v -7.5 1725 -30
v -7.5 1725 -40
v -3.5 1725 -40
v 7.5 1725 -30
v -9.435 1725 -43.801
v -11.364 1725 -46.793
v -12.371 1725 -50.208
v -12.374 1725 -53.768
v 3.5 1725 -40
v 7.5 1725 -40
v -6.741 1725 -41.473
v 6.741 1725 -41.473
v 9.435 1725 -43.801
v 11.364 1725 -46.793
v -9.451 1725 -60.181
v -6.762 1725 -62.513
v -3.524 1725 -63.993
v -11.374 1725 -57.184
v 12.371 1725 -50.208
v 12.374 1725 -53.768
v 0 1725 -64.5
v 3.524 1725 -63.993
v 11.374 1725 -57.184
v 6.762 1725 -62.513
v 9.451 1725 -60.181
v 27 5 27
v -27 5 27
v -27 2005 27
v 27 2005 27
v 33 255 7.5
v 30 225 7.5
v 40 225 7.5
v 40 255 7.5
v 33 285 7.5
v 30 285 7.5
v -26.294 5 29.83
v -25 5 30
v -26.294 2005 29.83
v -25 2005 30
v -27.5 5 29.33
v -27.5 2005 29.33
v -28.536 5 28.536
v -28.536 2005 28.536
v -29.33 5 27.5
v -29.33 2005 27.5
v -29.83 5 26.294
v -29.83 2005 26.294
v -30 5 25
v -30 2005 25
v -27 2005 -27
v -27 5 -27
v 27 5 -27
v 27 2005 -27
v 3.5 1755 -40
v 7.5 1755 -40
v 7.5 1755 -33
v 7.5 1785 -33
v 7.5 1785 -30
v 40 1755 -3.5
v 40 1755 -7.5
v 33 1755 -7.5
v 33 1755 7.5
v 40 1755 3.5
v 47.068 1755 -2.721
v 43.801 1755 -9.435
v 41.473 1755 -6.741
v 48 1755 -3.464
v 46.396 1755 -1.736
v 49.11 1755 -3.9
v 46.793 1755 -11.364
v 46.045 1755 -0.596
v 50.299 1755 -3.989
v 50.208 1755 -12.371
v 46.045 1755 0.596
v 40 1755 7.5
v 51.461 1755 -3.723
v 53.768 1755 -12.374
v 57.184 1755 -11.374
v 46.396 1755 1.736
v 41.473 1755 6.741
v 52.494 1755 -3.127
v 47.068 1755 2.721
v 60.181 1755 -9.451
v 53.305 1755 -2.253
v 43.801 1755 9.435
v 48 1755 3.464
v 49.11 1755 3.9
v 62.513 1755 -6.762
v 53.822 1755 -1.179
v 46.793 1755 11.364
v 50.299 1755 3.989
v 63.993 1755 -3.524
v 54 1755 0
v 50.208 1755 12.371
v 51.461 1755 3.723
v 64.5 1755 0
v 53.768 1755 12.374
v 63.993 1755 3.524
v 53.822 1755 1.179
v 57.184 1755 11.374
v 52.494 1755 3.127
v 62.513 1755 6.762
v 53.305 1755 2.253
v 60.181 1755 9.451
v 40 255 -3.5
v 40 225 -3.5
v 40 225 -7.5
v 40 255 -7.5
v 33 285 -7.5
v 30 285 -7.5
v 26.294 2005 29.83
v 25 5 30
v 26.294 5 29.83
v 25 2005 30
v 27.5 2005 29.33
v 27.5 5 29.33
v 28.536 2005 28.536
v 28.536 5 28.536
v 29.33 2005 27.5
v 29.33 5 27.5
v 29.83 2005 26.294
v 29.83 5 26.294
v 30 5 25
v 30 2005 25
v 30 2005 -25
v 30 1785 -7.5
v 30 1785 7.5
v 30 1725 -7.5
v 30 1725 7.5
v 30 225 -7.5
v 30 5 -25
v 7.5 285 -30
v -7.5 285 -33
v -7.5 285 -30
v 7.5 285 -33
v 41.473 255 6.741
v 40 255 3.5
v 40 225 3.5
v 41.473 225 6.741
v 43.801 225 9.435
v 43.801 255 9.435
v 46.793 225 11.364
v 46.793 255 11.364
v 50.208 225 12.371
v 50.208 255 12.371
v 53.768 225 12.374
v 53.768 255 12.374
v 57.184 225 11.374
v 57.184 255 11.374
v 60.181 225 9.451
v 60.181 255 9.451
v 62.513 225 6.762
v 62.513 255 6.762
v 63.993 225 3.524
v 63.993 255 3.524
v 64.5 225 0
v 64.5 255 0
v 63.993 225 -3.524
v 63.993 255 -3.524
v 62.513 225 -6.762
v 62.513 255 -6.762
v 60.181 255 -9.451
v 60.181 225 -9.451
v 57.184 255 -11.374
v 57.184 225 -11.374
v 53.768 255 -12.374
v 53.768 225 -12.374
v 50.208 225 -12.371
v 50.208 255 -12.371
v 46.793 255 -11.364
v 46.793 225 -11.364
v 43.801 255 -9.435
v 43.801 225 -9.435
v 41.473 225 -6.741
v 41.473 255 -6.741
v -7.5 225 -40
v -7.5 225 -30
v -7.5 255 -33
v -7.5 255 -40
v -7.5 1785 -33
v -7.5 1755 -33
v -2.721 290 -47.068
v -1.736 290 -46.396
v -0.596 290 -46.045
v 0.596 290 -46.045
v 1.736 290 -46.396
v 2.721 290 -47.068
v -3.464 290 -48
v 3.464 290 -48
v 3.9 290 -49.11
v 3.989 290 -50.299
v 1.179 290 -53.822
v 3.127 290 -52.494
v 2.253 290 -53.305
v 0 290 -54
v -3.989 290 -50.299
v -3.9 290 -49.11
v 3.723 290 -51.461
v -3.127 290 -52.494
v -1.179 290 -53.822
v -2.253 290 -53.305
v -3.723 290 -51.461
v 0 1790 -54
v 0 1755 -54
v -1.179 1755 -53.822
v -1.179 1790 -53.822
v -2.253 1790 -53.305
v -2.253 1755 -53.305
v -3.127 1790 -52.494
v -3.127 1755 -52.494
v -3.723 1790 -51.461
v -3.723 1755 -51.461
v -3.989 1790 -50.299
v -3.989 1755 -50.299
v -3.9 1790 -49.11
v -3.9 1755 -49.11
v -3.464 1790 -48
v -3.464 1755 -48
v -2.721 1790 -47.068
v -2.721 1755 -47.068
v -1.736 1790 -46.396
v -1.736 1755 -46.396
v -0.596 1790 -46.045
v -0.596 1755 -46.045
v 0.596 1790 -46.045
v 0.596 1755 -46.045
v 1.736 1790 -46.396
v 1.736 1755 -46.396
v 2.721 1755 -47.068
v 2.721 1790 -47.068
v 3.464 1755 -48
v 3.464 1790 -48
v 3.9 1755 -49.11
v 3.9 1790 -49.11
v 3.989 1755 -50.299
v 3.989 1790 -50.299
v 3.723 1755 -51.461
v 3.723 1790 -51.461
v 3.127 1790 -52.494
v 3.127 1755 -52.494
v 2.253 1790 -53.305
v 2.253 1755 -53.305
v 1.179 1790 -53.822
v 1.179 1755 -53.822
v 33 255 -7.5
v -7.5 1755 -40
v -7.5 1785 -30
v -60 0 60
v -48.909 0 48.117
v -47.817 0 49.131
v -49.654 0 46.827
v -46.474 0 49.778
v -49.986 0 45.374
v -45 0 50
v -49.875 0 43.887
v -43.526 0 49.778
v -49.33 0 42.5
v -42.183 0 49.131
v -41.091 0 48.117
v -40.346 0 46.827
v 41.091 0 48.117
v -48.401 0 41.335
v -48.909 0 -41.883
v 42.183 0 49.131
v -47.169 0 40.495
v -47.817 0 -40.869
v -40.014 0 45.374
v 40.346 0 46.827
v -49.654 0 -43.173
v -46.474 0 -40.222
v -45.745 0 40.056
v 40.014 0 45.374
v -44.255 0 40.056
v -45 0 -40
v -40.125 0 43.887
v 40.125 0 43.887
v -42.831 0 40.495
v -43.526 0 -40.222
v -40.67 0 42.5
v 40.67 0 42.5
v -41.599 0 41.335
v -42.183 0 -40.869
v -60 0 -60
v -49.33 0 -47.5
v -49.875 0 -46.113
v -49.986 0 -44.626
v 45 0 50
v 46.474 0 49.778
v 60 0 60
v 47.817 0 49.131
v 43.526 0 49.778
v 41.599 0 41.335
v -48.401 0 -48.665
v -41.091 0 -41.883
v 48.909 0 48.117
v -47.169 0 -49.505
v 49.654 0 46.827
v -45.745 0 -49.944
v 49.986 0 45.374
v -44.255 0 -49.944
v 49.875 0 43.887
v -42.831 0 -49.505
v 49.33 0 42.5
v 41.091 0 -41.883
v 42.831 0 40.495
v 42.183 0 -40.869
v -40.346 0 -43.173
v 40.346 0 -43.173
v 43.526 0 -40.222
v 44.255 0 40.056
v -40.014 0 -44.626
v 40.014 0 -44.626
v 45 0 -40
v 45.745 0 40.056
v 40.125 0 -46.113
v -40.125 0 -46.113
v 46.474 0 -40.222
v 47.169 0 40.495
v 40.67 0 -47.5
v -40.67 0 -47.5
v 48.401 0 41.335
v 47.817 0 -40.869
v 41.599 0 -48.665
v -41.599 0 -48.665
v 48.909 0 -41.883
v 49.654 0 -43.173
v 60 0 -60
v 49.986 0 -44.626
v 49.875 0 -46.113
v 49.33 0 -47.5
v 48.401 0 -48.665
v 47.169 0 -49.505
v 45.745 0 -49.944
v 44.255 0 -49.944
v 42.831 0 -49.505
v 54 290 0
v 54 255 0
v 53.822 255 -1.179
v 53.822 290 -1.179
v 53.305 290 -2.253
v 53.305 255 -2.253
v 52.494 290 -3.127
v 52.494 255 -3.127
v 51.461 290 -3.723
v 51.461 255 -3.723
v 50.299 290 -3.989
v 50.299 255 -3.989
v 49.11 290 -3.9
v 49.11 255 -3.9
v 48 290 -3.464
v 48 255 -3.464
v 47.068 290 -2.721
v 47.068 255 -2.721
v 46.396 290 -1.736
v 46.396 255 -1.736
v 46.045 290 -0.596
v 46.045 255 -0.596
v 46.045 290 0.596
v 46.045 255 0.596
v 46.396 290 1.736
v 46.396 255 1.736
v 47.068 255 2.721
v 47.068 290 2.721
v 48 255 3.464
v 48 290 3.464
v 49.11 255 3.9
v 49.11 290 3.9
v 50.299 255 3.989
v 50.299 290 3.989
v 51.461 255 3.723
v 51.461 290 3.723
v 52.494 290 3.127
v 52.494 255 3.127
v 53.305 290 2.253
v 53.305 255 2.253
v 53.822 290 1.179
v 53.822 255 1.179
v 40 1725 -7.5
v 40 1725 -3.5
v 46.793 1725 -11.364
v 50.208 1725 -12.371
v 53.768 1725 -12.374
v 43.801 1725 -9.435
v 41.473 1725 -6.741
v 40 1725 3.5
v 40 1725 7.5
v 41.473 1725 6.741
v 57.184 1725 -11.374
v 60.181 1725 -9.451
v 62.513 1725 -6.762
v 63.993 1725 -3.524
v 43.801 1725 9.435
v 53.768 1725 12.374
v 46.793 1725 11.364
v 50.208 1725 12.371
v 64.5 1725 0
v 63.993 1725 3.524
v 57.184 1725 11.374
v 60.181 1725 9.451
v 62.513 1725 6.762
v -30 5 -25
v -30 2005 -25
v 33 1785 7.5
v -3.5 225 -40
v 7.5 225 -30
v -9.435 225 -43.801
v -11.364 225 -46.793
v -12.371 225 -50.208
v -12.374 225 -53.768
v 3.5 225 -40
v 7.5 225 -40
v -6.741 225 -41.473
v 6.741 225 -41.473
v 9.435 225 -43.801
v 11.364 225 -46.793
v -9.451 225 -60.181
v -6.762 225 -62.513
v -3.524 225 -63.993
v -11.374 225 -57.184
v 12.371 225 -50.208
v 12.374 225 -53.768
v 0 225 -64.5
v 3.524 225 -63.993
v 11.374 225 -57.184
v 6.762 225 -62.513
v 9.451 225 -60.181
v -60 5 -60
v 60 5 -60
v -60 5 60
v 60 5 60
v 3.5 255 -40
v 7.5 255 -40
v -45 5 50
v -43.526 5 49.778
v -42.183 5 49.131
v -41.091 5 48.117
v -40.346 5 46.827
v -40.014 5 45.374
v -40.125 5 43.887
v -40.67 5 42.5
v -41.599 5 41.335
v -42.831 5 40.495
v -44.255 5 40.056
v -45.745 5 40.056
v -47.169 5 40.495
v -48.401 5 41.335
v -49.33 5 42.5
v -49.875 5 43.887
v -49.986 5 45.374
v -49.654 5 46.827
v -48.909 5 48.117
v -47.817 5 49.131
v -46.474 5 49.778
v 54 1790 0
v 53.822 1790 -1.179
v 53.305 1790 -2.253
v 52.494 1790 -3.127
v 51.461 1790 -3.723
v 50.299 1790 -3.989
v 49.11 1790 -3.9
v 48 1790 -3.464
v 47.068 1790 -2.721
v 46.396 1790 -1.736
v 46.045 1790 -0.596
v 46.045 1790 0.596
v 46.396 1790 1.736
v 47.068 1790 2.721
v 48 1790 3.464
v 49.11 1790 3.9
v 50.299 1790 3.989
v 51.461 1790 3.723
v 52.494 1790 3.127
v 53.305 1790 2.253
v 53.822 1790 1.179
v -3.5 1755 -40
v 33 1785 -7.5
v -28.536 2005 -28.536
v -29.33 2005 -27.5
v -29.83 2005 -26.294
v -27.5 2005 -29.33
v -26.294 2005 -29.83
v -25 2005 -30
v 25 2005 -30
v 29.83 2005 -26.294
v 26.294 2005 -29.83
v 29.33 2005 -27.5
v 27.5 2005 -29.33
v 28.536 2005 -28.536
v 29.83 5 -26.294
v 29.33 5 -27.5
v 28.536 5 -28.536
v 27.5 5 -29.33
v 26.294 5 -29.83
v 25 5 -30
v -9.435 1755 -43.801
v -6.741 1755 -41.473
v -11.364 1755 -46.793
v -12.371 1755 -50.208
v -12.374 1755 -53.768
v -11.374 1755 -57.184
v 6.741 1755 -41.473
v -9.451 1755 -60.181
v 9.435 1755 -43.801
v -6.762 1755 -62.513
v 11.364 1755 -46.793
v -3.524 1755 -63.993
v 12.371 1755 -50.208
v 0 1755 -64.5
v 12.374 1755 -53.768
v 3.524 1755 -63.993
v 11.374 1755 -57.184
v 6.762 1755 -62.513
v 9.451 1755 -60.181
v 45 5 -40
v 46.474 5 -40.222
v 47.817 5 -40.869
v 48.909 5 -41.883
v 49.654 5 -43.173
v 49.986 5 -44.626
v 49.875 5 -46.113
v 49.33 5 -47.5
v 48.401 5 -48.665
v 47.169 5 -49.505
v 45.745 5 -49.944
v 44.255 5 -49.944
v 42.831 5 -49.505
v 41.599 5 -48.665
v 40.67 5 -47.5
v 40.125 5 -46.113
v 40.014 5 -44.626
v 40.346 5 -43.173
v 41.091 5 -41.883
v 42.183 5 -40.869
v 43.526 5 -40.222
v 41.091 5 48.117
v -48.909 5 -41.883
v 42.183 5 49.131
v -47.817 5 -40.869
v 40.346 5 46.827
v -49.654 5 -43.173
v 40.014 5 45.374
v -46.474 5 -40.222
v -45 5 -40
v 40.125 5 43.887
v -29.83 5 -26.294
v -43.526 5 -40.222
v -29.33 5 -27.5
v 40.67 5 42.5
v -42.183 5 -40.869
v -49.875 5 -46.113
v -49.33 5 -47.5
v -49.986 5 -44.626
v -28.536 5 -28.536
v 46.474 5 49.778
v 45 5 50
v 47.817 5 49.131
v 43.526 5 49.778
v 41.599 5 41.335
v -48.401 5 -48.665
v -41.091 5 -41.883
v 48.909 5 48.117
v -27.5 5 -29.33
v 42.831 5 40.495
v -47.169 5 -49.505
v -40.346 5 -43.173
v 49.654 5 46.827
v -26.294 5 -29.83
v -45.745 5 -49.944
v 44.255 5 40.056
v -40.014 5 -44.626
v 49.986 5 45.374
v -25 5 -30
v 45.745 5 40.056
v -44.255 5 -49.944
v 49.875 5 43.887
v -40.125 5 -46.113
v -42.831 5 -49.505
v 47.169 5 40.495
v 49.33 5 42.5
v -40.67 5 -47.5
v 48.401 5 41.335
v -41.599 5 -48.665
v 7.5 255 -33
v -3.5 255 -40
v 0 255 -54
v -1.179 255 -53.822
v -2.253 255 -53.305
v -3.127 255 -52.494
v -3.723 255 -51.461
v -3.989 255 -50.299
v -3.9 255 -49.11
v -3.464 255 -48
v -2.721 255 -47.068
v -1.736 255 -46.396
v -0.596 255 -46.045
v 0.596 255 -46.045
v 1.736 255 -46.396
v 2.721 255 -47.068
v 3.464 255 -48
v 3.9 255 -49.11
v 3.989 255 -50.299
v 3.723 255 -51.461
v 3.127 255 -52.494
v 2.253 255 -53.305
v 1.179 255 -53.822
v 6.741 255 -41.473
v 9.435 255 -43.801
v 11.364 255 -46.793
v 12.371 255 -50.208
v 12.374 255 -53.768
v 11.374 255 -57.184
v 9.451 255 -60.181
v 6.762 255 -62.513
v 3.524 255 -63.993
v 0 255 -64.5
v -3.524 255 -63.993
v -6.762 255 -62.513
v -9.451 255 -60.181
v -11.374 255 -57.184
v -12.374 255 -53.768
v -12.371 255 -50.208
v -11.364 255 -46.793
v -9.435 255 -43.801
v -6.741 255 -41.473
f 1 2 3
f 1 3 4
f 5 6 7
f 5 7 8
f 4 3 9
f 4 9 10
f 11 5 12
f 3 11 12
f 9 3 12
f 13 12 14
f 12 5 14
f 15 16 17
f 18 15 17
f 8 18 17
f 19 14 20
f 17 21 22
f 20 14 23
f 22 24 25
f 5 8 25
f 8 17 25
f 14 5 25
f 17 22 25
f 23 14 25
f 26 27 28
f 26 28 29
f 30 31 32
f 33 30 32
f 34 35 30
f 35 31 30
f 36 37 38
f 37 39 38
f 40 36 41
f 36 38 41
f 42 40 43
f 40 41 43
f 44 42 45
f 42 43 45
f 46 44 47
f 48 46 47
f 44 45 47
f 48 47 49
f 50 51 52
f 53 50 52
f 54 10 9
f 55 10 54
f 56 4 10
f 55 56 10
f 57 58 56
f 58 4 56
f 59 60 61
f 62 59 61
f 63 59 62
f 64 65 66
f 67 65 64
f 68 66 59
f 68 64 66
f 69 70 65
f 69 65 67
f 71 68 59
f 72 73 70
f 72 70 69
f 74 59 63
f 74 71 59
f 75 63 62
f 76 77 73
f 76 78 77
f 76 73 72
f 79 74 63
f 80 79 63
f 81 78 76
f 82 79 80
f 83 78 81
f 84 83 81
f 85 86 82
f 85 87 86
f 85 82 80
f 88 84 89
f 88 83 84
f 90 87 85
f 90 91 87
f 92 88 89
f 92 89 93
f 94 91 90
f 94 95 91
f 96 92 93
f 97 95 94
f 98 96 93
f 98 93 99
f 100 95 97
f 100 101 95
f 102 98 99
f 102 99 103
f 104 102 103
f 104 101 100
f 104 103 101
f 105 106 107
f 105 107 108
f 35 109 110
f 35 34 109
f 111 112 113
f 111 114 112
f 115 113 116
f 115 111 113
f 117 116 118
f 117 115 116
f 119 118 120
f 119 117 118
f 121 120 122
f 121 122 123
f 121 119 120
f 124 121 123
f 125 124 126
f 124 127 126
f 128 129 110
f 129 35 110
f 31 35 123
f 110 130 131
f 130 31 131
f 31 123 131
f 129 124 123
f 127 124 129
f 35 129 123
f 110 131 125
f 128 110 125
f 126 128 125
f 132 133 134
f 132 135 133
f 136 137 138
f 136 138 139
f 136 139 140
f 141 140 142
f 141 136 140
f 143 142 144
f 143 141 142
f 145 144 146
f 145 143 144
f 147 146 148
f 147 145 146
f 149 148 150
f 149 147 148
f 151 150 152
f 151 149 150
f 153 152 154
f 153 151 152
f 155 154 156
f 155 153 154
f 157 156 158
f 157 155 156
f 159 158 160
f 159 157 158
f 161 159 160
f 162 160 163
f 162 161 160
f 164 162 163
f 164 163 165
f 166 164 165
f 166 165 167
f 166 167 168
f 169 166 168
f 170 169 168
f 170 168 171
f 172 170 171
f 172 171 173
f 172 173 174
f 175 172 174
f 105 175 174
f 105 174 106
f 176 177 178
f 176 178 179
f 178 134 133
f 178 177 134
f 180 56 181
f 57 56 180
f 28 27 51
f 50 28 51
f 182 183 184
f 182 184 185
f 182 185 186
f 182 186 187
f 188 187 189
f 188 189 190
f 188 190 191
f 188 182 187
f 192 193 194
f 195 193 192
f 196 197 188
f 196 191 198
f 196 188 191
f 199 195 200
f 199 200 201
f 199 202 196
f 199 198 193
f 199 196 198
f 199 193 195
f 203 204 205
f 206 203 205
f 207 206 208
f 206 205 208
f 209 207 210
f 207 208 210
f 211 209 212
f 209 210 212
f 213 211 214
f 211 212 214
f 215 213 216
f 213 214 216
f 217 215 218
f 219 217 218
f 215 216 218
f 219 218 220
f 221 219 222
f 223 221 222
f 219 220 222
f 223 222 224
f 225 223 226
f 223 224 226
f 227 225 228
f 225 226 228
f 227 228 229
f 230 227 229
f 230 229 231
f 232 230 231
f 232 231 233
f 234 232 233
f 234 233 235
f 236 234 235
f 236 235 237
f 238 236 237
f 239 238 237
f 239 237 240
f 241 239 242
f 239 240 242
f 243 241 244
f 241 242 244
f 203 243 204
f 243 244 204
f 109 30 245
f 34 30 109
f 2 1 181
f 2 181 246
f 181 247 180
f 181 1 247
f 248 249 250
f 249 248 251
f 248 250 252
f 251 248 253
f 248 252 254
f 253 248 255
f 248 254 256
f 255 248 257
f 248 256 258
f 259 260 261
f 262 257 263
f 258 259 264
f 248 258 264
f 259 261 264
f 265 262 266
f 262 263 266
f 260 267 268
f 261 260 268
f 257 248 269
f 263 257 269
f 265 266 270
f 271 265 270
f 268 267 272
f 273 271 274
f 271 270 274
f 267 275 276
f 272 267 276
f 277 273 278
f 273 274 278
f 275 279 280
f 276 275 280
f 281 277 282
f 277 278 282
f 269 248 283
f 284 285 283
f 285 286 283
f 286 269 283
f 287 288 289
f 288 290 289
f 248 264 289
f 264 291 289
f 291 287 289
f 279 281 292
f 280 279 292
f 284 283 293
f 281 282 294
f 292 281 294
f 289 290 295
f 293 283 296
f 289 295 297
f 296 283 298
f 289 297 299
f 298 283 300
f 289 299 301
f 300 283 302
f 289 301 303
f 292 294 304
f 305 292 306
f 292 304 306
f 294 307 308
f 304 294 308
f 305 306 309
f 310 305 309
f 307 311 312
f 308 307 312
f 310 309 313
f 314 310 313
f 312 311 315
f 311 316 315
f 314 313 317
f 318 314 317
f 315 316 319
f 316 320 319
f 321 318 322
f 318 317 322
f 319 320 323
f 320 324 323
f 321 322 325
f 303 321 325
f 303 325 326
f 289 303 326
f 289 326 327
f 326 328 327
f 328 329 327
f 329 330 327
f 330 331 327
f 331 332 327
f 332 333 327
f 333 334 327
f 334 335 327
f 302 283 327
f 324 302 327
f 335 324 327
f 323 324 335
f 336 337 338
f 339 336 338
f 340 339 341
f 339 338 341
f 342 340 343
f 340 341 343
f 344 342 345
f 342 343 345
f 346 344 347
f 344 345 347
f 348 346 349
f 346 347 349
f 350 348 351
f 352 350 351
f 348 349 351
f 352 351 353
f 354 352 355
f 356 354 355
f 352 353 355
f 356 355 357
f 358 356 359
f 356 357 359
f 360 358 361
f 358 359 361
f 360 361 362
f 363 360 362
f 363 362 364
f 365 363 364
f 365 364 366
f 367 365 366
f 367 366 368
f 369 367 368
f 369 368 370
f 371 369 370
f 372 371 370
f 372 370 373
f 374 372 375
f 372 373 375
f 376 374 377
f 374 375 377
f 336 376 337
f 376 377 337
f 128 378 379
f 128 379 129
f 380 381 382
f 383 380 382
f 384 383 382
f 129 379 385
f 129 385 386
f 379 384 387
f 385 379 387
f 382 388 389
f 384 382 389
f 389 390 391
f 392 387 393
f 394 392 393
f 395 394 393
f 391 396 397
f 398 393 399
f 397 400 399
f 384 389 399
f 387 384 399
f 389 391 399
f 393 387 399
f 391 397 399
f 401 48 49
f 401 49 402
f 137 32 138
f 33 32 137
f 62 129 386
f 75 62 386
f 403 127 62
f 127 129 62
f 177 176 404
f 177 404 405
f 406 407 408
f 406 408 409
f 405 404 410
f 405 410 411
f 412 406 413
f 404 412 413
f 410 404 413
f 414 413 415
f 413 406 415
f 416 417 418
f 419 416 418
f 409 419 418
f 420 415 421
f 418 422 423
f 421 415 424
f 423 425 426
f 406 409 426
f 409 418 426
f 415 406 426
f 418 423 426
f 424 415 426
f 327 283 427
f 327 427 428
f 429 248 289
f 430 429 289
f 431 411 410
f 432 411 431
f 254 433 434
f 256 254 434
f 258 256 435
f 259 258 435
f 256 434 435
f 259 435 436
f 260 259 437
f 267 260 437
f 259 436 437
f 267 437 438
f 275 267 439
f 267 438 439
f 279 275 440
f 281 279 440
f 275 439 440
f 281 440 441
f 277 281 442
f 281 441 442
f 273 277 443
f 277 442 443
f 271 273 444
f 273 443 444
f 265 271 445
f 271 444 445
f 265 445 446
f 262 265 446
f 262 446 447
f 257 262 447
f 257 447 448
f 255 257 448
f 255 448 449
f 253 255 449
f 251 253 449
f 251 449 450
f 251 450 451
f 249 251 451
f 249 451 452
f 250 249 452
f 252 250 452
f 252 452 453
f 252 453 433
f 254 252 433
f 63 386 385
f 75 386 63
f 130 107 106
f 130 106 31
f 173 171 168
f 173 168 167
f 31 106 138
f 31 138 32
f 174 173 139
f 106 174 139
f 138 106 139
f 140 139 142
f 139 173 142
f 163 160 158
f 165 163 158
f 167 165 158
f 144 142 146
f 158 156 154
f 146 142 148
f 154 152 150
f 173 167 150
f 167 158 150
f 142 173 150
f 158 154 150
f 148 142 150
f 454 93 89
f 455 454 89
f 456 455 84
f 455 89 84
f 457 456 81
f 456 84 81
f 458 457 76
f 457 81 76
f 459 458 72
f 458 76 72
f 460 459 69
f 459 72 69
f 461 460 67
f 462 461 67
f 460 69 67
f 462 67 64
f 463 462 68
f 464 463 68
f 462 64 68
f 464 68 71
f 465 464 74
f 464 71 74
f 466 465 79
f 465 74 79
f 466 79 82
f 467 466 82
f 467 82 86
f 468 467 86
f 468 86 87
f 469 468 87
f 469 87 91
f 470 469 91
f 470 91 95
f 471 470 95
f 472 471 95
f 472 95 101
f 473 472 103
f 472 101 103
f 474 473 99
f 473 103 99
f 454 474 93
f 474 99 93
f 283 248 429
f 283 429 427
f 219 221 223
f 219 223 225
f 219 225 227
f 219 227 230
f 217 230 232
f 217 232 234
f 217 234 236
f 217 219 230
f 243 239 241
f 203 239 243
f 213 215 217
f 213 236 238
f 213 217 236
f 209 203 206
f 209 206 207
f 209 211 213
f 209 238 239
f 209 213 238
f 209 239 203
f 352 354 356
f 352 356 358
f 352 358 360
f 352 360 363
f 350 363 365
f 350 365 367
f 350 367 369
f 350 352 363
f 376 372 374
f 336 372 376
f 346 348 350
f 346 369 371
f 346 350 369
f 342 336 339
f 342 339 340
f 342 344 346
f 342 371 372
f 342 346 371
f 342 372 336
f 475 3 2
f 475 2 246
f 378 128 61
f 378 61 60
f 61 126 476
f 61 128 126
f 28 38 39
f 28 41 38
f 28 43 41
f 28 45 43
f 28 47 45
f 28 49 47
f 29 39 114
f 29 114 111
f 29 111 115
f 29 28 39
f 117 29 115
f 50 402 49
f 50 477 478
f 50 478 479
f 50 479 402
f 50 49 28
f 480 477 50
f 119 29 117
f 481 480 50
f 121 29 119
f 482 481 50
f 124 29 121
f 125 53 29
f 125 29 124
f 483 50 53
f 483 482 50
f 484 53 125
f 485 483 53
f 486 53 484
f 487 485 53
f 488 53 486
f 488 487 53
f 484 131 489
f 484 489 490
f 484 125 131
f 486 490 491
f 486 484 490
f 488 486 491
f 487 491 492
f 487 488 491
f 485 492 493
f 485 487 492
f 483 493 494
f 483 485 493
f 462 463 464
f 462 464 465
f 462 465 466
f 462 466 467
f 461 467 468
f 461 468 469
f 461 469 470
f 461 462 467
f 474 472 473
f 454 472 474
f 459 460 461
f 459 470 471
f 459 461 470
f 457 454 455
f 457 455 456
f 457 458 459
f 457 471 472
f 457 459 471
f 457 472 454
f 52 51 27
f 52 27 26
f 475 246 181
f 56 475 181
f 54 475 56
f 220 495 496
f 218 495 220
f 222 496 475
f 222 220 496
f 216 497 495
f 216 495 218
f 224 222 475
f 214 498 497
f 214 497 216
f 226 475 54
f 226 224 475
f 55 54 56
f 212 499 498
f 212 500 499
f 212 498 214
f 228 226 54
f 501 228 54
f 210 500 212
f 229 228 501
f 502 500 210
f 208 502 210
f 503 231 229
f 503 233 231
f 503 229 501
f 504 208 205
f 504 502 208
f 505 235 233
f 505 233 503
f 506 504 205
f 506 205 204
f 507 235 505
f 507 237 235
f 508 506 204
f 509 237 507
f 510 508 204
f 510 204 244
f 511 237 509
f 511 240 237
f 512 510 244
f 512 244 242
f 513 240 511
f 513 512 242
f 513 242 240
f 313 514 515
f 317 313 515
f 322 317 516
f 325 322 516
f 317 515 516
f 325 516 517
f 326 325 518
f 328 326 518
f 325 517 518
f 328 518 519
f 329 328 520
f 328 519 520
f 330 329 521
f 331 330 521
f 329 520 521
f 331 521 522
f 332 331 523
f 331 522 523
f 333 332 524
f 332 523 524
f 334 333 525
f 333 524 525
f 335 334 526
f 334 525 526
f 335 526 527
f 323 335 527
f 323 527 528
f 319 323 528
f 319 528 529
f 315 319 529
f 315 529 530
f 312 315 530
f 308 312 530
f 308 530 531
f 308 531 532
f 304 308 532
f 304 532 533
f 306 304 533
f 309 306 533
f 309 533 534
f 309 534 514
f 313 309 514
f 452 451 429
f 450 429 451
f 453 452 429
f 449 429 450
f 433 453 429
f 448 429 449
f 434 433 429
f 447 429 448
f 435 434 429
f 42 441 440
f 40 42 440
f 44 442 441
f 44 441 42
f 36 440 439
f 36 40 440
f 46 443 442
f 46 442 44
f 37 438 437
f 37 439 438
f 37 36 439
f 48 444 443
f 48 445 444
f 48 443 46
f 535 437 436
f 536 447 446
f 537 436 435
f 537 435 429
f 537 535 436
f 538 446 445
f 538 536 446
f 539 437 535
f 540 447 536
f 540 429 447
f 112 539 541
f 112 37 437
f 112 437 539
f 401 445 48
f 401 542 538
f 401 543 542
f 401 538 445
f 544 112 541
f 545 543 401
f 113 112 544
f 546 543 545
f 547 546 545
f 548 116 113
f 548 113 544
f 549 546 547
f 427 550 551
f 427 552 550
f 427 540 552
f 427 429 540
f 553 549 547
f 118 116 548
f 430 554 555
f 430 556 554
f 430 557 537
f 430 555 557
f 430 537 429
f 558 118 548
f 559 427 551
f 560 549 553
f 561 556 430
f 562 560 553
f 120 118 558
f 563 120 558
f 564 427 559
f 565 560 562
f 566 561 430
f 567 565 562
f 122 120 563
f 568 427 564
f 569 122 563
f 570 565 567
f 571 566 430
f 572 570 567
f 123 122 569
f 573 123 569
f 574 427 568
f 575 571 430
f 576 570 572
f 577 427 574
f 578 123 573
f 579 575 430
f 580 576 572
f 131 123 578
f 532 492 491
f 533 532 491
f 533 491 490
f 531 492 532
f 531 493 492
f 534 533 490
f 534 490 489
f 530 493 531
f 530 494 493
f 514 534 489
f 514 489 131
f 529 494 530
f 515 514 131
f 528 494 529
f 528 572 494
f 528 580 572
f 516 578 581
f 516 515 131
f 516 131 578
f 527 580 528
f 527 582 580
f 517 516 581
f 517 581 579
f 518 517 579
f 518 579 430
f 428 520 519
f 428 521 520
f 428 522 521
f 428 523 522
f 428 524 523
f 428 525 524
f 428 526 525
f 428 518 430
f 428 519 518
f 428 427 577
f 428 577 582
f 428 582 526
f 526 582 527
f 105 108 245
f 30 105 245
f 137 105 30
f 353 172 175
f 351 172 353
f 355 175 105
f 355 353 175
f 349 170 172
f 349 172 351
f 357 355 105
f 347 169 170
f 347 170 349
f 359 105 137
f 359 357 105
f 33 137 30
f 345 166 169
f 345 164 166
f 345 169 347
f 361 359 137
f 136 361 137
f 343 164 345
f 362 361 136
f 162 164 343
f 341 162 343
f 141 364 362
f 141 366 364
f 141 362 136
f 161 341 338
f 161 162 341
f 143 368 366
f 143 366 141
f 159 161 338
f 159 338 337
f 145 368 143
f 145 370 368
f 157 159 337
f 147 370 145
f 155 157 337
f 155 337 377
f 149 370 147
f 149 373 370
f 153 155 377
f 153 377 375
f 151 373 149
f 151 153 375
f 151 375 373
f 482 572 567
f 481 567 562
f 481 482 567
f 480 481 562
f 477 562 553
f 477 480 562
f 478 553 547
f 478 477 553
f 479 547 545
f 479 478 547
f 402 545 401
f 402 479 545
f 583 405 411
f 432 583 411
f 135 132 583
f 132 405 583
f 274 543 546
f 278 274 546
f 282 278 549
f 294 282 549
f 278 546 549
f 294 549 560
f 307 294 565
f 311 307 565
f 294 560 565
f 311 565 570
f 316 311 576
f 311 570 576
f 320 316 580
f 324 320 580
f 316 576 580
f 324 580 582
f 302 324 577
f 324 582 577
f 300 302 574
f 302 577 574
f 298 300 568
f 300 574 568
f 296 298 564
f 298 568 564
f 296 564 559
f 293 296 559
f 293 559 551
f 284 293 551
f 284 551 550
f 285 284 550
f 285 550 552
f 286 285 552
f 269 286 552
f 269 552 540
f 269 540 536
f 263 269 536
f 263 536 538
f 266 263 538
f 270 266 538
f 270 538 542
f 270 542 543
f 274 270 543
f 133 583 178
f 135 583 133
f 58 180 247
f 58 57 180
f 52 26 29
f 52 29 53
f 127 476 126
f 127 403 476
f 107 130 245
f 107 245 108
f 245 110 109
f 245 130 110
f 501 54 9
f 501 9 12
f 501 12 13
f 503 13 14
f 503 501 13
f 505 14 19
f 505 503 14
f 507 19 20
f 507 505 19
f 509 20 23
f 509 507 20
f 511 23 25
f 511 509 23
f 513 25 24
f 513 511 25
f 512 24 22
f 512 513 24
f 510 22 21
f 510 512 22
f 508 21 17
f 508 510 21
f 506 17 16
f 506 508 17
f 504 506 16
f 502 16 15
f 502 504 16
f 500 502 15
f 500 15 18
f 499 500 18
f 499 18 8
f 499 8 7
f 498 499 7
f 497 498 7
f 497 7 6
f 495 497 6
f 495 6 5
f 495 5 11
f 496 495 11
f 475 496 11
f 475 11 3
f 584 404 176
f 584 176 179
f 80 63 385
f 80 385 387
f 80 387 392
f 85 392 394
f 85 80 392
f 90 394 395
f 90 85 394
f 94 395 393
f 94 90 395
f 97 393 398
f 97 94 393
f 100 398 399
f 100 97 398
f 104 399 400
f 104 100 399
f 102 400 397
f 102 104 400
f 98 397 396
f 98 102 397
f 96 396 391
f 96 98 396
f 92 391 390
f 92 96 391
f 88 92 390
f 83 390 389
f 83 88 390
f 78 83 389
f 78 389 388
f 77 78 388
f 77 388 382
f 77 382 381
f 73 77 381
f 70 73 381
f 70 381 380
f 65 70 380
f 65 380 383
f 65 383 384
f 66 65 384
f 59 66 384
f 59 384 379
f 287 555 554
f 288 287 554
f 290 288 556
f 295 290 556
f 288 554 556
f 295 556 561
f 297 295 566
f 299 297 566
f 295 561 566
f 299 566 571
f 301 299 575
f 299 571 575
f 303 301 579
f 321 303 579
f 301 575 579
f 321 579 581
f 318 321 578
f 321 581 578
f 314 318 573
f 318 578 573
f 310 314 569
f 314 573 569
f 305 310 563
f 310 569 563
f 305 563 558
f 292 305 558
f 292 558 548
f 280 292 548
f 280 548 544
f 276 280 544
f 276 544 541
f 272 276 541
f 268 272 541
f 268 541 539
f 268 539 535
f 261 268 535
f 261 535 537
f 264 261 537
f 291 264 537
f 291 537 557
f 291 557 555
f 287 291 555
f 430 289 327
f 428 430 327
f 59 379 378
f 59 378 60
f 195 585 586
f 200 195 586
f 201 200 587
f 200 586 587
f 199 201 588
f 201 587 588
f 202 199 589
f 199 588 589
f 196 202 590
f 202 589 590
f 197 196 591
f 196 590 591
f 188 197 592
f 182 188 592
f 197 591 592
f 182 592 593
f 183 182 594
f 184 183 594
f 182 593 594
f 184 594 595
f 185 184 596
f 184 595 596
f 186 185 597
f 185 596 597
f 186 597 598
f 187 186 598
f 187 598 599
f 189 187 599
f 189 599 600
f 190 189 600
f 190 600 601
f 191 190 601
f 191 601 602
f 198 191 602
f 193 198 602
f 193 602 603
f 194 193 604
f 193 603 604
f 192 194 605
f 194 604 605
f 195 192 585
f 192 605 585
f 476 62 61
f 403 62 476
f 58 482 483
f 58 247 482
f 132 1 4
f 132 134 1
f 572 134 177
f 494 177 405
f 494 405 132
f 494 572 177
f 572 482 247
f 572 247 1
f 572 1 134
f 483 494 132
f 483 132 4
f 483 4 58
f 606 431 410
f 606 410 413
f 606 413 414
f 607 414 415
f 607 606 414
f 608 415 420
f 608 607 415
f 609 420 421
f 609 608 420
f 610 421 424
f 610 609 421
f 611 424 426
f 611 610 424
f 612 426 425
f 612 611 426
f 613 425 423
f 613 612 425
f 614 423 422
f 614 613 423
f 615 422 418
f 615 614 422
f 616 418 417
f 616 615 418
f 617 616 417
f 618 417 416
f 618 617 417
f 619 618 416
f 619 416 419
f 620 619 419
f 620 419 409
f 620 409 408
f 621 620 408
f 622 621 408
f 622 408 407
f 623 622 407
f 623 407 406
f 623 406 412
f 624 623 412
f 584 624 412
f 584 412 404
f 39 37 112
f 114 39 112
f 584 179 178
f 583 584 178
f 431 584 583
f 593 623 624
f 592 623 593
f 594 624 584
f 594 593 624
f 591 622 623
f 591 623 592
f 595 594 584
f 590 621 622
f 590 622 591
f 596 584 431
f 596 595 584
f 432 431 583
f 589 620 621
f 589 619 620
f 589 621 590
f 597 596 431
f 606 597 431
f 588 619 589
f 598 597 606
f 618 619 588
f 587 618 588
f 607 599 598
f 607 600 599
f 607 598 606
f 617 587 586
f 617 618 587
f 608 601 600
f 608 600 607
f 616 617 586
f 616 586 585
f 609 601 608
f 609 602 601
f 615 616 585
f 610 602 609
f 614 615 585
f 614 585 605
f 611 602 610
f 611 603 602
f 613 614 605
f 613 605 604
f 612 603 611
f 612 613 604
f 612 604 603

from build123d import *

# Parameters (mm, degrees)
SKETCH_1_W                         = 120
SKETCH_1_H                         = 120
EXTRUDE_1_DEPTH                    = 5
SKETCH_2_W                         = 60
SKETCH_2_H                         = 60
SKETCH_2_W_2                       = 54
SKETCH_2_H_2                       = 54
EXTRUDE_2_DEPTH                    = 2000
FILLET_1_R                         = 5
SKETCH_3_R                         = 5
CUT_EXTRUDE_1_DEPTH                = 2000
EXTRUDE_5_DEPTH                    = 7.5
PATTERN_LINEAR_1_COUNT             = 2
PATTERN_LINEAR_1_PITCH             = 1500
SKETCH_7_R                         = 12.5
EXTRUDE_6_DEPTH                    = 30
SKETCH_8_R                         = 4
EXTRUDE_7_DEPTH                    = 35
PATTERN_LINEAR_2_COUNT             = 2
PATTERN_LINEAR_2_PITCH             = 1500
PATTERN_CIRCULAR_2_COUNT           = 2
PATTERN_CIRCULAR_2_ANGLE           = 90
PATTERN_CIRCULAR_2_COPY_1_DEPTH    = 7.5
PATTERN_CIRCULAR_2_COPY_2_SKETCH_R = 12.5
PATTERN_CIRCULAR_2_COPY_2_DEPTH    = 30
PATTERN_CIRCULAR_2_COPY_3_SKETCH_R = 4
PATTERN_CIRCULAR_2_COPY_3_DEPTH    = 35


with BuildPart() as part:
    # 草图1 → 凸台-拉伸1 (new body)
    with BuildSketch(Plane(origin=(0, 0, 0), x_dir=(1, 0, 0), z_dir=(0, 1, 0))):
        Rectangle(SKETCH_1_W, SKETCH_1_H)
    extrude(amount=EXTRUDE_1_DEPTH)

    # 草图2 → 凸台-拉伸2 (add)
    with BuildSketch(Plane(origin=(0, 5, 0), x_dir=(1, 0, 0), z_dir=(0, 1, 0))):
        Rectangle(SKETCH_2_W, SKETCH_2_H)
        Rectangle(SKETCH_2_W_2, SKETCH_2_H_2, mode=Mode.SUBTRACT)
    extrude(amount=EXTRUDE_2_DEPTH)

    # 圆角1
    fillet_1_edges = [part.edges().sort_by_distance(p)[0] for p in [
        (-30, 1005, 30),
        (30, 1005, 30),
        (-30, 1005, -30),
        (30, 1005, -30),
    ]]
    fillet(fillet_1_edges, radius=FILLET_1_R)

    # 草图3 → 切除-拉伸1 (cut)
    with BuildSketch(Plane(origin=(0, 5, 0), x_dir=(1, 0, 0), z_dir=(0, 1, 0))):
        with Locations((-45, 45)):
            Circle(SKETCH_3_R)
        with Locations((45, 45)):
            Circle(SKETCH_3_R)
        with Locations((-45, -45)):
            Circle(SKETCH_3_R)
        with Locations((45, -45)):
            Circle(SKETCH_3_R)
    extrude(amount=-CUT_EXTRUDE_1_DEPTH, mode=Mode.SUBTRACT)

    # 草图6 → 凸台-拉伸5 (add, symmetric)
    with BuildSketch(Plane(origin=(0, 0, 0), x_dir=(0, 0, -1), z_dir=(1, 0, 0))):
        Polygon((30, 1785), (30, 1725), (40, 1725), (40, 1755), (33, 1755), (33, 1785), align=None)
    extrude_5 = extrude(amount=EXTRUDE_5_DEPTH, both=True)

    # 阵列(线性)1: 凸台-拉伸5 ×2
    with Locations(*[(0, -i * PATTERN_LINEAR_1_PITCH, 0) for i in range(1, PATTERN_LINEAR_1_COUNT)]):
        add(extrude_5)

    # 草图7 → 凸台-拉伸6 (add)
    with BuildSketch(Plane(origin=(0, 1755, 0), x_dir=(1, 0, 0), z_dir=(0, 1, 0))):
        with Locations((0, 52)):
            Circle(SKETCH_7_R)
    extrude_6 = extrude(amount=-EXTRUDE_6_DEPTH)

    # 草图8 → 凸台-拉伸7 (add)
    with BuildSketch(Plane(origin=(0, 1755, 0), x_dir=(1, 0, 0), z_dir=(0, 1, 0))):
        with Locations((0, 50)):
            Circle(SKETCH_8_R)
    extrude_7 = extrude(amount=EXTRUDE_7_DEPTH)

    # 阵列(线性)2: 凸台-拉伸6, 凸台-拉伸7 ×2
    with Locations(*[(0, -i * PATTERN_LINEAR_2_PITCH, 0) for i in range(1, PATTERN_LINEAR_2_COUNT)]):
        add(extrude_6)
        add(extrude_7)

    # 阵列(圆周)2: 凸台-拉伸5, 凸台-拉伸6, 凸台-拉伸7 ×2 about axis
    pattern_circular_2_axis = Axis((0, 2105, 0), (0, -1, 0))
    add([extrude_5.rotate(pattern_circular_2_axis, i * PATTERN_CIRCULAR_2_ANGLE / (PATTERN_CIRCULAR_2_COUNT - 1)) for i in range(1, PATTERN_CIRCULAR_2_COUNT)])
    add([extrude_6.rotate(pattern_circular_2_axis, i * PATTERN_CIRCULAR_2_ANGLE / (PATTERN_CIRCULAR_2_COUNT - 1)) for i in range(1, PATTERN_CIRCULAR_2_COUNT)])
    add([extrude_7.rotate(pattern_circular_2_axis, i * PATTERN_CIRCULAR_2_ANGLE / (PATTERN_CIRCULAR_2_COUNT - 1)) for i in range(1, PATTERN_CIRCULAR_2_COUNT)])

    # 阵列(圆周)2 copy 1 sketch → 阵列(圆周)2 copy 1 (add, symmetric)
    with BuildSketch(Plane(origin=(0, -1500, 0), x_dir=(1, 0, 0), z_dir=(0, 0, 1))):
        Polygon((30, 1785), (30, 1725), (40, 1725), (40, 1755), (33, 1755), (33, 1785), align=None)
    extrude(amount=PATTERN_CIRCULAR_2_COPY_1_DEPTH, both=True)

    # 阵列(圆周)2 copy 2 sketch → 阵列(圆周)2 copy 2 (add)
    with BuildSketch(Plane.ZX.offset(255)):
        with Locations((0, 52)):
            Circle(PATTERN_CIRCULAR_2_COPY_2_SKETCH_R)
    extrude(amount=-PATTERN_CIRCULAR_2_COPY_2_DEPTH)

    # 阵列(圆周)2 copy 3 sketch → 阵列(圆周)2 copy 3 (add)
    with BuildSketch(Plane.ZX.offset(255)):
        with Locations((0, 50)):
            Circle(PATTERN_CIRCULAR_2_COPY_3_SKETCH_R)
    extrude(amount=PATTERN_CIRCULAR_2_COPY_3_DEPTH)


solid = part.part
